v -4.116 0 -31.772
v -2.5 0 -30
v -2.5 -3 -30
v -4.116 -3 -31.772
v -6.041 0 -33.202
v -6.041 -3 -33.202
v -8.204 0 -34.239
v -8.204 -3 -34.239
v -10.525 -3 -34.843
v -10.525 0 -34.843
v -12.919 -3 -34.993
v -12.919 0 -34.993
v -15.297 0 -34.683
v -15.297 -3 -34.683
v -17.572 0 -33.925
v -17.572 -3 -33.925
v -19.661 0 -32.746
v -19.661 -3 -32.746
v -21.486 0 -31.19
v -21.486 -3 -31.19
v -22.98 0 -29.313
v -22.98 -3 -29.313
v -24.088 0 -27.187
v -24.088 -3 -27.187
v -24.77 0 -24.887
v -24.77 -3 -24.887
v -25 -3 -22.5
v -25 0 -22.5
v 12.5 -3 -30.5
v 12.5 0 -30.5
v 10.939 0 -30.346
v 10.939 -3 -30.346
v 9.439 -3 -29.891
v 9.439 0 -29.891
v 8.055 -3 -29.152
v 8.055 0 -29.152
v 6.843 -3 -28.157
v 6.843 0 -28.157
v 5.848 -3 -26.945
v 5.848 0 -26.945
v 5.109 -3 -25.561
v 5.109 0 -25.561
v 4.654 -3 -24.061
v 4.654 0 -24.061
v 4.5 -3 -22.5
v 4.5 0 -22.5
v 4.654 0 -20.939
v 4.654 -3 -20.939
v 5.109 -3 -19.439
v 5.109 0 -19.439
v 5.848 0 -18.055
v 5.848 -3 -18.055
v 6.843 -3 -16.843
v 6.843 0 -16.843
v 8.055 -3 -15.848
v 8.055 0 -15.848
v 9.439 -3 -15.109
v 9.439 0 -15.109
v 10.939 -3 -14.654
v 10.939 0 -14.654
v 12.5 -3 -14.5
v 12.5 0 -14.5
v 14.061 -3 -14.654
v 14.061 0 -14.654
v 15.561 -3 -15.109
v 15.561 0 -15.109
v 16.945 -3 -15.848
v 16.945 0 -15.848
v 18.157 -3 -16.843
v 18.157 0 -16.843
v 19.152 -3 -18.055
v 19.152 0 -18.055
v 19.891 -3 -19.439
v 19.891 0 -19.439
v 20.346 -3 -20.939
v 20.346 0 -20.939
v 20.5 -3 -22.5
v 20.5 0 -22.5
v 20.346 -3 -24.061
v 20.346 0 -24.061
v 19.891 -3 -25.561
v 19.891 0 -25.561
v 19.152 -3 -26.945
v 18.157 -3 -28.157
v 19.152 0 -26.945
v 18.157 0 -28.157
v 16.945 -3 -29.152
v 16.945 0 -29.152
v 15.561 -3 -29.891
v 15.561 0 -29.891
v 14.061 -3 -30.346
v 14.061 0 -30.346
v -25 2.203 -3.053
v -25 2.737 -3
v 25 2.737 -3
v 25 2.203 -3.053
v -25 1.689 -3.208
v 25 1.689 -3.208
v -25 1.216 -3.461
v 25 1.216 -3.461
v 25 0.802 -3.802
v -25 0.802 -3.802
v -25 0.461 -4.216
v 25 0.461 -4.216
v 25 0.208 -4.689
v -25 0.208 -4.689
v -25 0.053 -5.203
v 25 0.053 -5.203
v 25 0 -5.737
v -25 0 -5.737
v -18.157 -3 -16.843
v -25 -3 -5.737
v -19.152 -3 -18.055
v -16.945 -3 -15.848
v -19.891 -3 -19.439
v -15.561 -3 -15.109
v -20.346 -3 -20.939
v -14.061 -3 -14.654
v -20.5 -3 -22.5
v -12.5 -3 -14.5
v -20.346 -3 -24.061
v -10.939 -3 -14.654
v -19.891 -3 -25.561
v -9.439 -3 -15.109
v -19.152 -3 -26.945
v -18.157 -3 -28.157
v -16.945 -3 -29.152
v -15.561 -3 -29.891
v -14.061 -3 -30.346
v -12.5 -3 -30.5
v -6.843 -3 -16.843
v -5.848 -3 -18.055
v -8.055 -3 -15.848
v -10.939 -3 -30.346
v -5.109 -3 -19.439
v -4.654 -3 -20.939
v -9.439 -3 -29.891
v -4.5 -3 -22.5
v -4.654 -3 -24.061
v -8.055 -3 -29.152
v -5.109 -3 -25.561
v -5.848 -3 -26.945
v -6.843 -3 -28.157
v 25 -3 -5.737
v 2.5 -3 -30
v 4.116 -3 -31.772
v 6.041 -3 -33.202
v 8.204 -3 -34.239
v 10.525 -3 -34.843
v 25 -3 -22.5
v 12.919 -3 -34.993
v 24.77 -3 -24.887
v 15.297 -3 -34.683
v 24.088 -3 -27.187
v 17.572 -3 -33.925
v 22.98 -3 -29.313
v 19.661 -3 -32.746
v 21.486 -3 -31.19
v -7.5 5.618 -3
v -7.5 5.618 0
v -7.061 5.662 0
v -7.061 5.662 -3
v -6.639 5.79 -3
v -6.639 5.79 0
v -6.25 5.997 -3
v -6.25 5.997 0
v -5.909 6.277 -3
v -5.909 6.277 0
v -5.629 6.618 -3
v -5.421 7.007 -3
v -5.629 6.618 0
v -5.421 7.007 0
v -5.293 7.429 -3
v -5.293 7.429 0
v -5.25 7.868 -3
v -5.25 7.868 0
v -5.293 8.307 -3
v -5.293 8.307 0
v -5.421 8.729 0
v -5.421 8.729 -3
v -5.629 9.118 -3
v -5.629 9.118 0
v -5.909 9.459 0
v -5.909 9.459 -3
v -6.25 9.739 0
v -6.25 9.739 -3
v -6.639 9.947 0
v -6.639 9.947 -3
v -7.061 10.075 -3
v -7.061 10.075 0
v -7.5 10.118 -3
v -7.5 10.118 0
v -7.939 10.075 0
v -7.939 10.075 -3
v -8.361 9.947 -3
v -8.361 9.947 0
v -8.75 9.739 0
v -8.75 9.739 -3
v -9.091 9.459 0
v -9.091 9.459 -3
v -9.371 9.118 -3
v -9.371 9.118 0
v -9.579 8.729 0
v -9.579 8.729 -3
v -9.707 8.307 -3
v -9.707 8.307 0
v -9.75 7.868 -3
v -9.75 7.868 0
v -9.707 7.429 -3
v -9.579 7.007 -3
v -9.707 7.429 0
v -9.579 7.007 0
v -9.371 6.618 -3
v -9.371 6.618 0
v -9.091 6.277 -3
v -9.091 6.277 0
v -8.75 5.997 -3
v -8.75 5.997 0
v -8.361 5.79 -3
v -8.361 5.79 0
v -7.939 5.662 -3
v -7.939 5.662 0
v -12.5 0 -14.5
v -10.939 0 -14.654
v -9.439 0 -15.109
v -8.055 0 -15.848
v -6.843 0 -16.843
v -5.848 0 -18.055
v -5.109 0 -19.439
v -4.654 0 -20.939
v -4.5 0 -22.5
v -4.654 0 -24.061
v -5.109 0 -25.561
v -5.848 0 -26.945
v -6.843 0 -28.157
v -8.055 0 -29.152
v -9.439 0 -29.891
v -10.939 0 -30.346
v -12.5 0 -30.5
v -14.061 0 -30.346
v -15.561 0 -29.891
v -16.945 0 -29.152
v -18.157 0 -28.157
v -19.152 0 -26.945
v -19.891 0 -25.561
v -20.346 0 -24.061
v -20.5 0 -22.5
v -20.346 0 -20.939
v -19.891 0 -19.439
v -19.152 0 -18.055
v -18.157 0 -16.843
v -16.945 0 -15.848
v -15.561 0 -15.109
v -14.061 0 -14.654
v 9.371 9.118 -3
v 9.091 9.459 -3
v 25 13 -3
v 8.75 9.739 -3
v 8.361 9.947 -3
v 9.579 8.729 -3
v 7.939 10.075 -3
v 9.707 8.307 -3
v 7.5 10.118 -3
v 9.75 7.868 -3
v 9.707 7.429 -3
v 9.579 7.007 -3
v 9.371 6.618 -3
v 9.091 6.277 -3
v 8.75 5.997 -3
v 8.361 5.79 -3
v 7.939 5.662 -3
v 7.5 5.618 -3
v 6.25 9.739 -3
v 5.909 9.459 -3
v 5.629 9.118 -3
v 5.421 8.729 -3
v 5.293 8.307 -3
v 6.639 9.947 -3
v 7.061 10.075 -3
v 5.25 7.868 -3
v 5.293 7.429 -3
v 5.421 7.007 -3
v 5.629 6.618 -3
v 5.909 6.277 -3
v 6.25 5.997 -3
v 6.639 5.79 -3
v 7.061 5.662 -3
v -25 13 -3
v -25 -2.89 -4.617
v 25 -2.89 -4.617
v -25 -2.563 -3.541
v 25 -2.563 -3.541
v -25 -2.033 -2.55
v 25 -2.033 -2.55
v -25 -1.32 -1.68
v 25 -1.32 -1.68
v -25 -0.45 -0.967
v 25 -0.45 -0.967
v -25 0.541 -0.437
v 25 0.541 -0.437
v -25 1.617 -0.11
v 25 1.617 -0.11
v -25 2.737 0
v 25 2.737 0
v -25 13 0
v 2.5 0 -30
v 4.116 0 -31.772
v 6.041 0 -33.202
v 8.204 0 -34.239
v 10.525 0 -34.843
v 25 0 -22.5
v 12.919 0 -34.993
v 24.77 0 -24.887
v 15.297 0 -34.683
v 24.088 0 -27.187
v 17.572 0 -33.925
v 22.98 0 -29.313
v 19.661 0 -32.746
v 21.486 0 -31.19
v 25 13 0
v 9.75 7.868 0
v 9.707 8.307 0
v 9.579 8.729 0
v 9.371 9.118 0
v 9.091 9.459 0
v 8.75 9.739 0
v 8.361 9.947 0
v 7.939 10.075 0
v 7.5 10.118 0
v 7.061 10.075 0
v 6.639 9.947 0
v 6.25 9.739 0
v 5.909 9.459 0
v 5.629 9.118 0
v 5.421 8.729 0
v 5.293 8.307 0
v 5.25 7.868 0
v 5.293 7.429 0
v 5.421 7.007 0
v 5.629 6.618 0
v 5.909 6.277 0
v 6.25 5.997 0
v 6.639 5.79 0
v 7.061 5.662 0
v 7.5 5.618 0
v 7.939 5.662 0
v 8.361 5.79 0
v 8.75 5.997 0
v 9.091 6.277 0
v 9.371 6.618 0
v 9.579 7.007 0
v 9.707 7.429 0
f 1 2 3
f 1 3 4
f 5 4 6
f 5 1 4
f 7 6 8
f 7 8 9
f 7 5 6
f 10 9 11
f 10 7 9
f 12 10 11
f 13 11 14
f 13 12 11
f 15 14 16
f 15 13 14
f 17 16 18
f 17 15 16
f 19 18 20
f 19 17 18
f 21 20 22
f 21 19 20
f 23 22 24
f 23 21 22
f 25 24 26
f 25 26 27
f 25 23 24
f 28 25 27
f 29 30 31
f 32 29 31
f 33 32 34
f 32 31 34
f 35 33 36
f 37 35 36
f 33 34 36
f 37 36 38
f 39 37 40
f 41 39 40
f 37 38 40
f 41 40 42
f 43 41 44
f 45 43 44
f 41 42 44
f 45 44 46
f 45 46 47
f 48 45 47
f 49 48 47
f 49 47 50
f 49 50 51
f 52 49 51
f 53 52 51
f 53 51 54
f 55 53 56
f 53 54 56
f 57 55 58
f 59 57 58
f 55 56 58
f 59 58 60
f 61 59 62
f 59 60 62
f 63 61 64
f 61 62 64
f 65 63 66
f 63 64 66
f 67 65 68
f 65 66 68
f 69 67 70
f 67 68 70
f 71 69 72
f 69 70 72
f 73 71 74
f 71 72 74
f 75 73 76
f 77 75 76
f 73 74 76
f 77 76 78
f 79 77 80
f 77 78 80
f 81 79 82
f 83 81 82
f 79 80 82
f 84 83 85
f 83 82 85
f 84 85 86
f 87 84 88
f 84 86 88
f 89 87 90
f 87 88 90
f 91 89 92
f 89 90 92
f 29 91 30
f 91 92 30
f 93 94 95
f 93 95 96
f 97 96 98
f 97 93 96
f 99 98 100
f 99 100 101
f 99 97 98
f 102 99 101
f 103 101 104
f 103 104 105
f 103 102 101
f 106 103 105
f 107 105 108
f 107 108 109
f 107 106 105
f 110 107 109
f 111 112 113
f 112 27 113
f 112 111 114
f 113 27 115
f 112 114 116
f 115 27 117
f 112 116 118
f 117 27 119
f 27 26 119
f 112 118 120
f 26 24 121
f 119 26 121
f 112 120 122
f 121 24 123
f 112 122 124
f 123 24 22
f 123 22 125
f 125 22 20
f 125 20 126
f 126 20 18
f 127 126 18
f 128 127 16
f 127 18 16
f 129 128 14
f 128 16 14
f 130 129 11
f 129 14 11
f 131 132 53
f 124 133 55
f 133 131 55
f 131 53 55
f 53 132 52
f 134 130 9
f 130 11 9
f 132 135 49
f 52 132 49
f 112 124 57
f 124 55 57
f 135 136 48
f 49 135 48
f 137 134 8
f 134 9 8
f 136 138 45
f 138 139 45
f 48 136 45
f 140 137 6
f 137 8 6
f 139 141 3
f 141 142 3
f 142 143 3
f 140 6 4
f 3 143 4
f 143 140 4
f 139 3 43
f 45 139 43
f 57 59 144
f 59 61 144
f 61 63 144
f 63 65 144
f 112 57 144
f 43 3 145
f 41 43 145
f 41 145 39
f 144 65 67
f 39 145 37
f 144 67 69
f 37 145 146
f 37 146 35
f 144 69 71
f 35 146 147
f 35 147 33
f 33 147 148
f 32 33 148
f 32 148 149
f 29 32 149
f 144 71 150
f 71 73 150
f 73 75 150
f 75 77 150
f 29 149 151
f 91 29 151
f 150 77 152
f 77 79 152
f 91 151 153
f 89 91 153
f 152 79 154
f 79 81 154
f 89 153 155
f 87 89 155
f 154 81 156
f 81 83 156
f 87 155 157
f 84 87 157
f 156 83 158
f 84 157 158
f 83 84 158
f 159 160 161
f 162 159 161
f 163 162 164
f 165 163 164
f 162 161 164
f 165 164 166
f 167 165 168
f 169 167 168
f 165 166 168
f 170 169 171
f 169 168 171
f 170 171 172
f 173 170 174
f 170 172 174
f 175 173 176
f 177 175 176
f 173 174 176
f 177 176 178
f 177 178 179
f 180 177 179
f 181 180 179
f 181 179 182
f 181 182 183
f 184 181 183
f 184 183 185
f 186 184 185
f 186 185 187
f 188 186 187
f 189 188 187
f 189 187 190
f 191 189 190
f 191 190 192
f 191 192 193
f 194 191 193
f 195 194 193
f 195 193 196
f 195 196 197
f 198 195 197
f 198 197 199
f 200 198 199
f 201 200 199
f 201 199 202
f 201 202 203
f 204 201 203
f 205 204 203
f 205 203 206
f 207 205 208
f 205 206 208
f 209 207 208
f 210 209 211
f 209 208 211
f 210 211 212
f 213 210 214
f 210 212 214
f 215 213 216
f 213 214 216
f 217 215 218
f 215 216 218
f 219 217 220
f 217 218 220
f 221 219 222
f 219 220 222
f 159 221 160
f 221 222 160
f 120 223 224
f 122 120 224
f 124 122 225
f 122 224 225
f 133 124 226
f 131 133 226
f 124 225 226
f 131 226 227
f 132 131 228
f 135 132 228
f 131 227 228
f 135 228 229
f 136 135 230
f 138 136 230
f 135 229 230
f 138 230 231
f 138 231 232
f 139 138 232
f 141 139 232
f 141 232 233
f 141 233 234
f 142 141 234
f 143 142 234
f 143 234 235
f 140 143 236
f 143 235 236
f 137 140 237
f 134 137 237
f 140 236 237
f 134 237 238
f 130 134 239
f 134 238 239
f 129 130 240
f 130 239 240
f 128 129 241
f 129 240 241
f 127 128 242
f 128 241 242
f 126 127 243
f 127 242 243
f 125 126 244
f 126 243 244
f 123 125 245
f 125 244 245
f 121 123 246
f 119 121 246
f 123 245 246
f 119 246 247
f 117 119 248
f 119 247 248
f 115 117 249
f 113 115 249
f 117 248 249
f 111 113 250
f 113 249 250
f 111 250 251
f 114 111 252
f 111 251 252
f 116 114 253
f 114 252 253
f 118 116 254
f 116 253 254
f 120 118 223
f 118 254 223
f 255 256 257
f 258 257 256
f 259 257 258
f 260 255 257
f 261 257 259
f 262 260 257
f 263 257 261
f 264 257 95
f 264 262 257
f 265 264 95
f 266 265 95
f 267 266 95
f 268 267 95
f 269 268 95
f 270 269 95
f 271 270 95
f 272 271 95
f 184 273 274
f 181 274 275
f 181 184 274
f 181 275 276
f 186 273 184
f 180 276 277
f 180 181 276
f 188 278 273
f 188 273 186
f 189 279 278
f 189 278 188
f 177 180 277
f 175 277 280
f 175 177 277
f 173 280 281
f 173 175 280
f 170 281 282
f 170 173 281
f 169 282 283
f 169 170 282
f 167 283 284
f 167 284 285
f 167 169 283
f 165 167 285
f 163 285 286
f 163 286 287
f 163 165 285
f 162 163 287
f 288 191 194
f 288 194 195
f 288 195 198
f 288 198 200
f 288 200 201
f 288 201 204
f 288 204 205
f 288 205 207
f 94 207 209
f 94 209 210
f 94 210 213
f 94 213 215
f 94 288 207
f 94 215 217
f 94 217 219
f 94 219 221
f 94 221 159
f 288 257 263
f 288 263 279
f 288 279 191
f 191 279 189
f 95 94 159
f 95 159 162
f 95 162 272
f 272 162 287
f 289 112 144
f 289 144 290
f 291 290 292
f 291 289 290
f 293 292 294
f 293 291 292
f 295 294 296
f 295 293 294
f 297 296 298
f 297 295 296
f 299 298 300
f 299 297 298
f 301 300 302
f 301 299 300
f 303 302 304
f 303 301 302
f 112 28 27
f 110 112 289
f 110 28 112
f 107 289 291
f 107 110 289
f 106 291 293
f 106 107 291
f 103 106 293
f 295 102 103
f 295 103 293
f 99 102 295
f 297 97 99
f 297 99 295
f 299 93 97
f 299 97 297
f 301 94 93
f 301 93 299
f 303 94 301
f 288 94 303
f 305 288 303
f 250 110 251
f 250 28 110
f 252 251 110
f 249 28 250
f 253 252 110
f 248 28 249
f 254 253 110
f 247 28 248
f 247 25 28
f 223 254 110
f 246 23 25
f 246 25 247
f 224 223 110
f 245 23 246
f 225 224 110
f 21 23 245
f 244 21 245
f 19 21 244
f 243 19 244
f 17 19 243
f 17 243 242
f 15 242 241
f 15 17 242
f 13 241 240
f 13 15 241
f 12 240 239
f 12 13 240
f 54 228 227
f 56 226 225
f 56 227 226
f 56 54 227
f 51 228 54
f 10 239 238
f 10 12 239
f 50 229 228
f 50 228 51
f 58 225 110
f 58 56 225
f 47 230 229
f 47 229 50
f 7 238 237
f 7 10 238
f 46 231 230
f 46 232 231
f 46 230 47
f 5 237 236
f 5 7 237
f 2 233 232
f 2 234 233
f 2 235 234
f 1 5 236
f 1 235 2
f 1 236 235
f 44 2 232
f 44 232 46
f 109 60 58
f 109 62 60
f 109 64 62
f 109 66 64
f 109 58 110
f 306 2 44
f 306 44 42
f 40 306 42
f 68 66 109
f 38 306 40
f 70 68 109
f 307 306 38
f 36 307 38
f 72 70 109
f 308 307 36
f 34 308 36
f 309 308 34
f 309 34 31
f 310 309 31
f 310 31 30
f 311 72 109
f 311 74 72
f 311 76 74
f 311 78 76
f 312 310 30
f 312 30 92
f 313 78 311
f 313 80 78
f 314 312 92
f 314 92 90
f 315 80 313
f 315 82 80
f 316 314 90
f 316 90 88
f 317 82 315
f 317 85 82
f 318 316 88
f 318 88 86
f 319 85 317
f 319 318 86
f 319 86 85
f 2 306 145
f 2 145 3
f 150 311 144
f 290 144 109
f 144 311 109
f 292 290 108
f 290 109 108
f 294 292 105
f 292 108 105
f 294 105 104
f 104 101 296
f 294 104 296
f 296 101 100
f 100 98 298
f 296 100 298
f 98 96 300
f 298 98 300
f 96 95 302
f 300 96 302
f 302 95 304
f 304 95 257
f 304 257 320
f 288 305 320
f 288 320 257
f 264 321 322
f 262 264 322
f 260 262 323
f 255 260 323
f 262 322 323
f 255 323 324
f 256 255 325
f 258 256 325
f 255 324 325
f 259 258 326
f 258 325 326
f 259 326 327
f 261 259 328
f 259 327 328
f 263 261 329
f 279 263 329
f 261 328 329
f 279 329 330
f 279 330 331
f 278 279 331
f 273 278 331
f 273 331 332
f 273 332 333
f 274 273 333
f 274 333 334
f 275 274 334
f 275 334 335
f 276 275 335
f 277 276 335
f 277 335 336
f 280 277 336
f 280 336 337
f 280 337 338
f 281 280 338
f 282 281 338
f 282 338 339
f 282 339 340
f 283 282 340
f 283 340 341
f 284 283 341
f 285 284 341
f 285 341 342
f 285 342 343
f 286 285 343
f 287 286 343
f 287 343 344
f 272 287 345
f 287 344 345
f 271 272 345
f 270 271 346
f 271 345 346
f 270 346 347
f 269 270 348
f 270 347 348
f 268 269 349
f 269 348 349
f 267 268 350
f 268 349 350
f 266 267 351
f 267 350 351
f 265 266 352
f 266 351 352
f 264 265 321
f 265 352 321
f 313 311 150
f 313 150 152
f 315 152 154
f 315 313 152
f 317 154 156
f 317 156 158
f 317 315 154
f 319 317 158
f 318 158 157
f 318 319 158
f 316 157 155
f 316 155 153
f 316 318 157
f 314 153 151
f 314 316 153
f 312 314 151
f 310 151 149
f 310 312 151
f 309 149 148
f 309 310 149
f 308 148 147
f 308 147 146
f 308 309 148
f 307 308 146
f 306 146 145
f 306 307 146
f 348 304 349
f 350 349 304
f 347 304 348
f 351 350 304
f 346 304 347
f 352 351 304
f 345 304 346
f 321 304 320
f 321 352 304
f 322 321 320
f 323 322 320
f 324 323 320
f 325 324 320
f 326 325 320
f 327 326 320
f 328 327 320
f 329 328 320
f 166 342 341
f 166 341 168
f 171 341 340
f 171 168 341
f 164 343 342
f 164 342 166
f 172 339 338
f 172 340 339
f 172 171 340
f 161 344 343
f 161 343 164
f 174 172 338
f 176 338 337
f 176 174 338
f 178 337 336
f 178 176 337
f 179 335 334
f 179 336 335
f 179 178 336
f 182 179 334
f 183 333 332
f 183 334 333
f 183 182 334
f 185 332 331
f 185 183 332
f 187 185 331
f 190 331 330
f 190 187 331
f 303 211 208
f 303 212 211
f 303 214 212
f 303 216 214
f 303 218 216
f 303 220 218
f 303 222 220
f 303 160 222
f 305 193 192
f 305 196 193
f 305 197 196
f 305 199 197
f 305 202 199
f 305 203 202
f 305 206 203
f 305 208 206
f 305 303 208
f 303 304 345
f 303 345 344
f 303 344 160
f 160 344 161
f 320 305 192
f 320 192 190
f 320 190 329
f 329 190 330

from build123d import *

# Parameters (mm, degrees)
SKETCH_1_R                       = 8
SM_BASE_FLANGE_1_DEPTH           = 3
SM_EDGE_FLANGE_1_STRIP_W         = 17.4732
SM_EDGE_FLANGE_1_STRIP_H         = 3
SM_EDGE_FLANGE_1_STRIP_CUT_DEPTH = 50
SM_EDGE_FLANGE_1_DEPTH           = 50
SKETCH_9_R                       = 2.25
CUT_EXTRUDE_1_DEPTH              = 10


# Sheet-metal steps are written as plain solids
with BuildPart() as part:
    # Sketch 1 → 基体-法兰1 (new body)
    with BuildSketch(Plane(origin=(0, 0, 0), x_dir=(1, 0, 0), z_dir=(0, 1, 0))):
        with BuildLine():
            Line((-25, 22.5), (-25, 0))
            Line((-25, 0), (25, 0))
            Line((25, 0), (25, 22.5))
            ThreePointArc((25, 22.5), (16.452847075, 34.358541226), (2.5, 30))
            Line((2.5, 30), (-2.5, 30))
            ThreePointArc((-2.5, 30), (-16.452847075, 34.358541226), (-25, 22.5))
        make_face()
        with Locations(Location((-12.5, 22.5, 0), (0, 0, 270))):
            Circle(SKETCH_1_R, mode=Mode.SUBTRACT)
        with Locations(Location((12.5, 22.5, 0), (0, 0, 90))):
            Circle(SKETCH_1_R, mode=Mode.SUBTRACT)
    extrude(amount=-SM_BASE_FLANGE_1_DEPTH)

    # 边线-法兰1 strip (across the edge) → 边线-法兰1 strip cut (cut)
    with BuildSketch(Plane(origin=(-25, 0, 0), x_dir=(0, 0, -1), z_dir=(1, 0, 0))):
        with Locations((-3, -1.5)):
            Rectangle(SM_EDGE_FLANGE_1_STRIP_W, SM_EDGE_FLANGE_1_STRIP_H)
    extrude(amount=SM_EDGE_FLANGE_1_STRIP_CUT_DEPTH, mode=Mode.SUBTRACT)

    # 边线-法兰1 section (across the edge) → 边线-法兰1 (add)
    with BuildSketch(Plane(origin=(-25, 0, 0), x_dir=(0, 0, -1), z_dir=(1, 0, 0))):
        with BuildLine():
            Line((0, 2.7366), (0, 13))
            Line((0, 13), (3, 13))
            Line((3, 13), (3, 2.7366))
            ThreePointArc((3, 2.7366), (3.801531583, 0.801531583), (5.7366, 0))
            Line((5.7366, 0), (5.7366, -3))
            ThreePointArc((5.7366, -3), (1.680211239, -1.319788761), (0, 2.7366))
        make_face()
    extrude(amount=SM_EDGE_FLANGE_1_DEPTH)

    # 草图9 → 切除-拉伸1 (cut)
    with BuildSketch(Plane.XY):
        with Locations((7.5, 7.8683)):
            Circle(SKETCH_9_R)
        with Locations(Location((-7.5, 7.8683, 0), (0, 0, 270))):
            Circle(SKETCH_9_R)
    extrude(amount=-CUT_EXTRUDE_1_DEPTH, mode=Mode.SUBTRACT)


solid = part.part
